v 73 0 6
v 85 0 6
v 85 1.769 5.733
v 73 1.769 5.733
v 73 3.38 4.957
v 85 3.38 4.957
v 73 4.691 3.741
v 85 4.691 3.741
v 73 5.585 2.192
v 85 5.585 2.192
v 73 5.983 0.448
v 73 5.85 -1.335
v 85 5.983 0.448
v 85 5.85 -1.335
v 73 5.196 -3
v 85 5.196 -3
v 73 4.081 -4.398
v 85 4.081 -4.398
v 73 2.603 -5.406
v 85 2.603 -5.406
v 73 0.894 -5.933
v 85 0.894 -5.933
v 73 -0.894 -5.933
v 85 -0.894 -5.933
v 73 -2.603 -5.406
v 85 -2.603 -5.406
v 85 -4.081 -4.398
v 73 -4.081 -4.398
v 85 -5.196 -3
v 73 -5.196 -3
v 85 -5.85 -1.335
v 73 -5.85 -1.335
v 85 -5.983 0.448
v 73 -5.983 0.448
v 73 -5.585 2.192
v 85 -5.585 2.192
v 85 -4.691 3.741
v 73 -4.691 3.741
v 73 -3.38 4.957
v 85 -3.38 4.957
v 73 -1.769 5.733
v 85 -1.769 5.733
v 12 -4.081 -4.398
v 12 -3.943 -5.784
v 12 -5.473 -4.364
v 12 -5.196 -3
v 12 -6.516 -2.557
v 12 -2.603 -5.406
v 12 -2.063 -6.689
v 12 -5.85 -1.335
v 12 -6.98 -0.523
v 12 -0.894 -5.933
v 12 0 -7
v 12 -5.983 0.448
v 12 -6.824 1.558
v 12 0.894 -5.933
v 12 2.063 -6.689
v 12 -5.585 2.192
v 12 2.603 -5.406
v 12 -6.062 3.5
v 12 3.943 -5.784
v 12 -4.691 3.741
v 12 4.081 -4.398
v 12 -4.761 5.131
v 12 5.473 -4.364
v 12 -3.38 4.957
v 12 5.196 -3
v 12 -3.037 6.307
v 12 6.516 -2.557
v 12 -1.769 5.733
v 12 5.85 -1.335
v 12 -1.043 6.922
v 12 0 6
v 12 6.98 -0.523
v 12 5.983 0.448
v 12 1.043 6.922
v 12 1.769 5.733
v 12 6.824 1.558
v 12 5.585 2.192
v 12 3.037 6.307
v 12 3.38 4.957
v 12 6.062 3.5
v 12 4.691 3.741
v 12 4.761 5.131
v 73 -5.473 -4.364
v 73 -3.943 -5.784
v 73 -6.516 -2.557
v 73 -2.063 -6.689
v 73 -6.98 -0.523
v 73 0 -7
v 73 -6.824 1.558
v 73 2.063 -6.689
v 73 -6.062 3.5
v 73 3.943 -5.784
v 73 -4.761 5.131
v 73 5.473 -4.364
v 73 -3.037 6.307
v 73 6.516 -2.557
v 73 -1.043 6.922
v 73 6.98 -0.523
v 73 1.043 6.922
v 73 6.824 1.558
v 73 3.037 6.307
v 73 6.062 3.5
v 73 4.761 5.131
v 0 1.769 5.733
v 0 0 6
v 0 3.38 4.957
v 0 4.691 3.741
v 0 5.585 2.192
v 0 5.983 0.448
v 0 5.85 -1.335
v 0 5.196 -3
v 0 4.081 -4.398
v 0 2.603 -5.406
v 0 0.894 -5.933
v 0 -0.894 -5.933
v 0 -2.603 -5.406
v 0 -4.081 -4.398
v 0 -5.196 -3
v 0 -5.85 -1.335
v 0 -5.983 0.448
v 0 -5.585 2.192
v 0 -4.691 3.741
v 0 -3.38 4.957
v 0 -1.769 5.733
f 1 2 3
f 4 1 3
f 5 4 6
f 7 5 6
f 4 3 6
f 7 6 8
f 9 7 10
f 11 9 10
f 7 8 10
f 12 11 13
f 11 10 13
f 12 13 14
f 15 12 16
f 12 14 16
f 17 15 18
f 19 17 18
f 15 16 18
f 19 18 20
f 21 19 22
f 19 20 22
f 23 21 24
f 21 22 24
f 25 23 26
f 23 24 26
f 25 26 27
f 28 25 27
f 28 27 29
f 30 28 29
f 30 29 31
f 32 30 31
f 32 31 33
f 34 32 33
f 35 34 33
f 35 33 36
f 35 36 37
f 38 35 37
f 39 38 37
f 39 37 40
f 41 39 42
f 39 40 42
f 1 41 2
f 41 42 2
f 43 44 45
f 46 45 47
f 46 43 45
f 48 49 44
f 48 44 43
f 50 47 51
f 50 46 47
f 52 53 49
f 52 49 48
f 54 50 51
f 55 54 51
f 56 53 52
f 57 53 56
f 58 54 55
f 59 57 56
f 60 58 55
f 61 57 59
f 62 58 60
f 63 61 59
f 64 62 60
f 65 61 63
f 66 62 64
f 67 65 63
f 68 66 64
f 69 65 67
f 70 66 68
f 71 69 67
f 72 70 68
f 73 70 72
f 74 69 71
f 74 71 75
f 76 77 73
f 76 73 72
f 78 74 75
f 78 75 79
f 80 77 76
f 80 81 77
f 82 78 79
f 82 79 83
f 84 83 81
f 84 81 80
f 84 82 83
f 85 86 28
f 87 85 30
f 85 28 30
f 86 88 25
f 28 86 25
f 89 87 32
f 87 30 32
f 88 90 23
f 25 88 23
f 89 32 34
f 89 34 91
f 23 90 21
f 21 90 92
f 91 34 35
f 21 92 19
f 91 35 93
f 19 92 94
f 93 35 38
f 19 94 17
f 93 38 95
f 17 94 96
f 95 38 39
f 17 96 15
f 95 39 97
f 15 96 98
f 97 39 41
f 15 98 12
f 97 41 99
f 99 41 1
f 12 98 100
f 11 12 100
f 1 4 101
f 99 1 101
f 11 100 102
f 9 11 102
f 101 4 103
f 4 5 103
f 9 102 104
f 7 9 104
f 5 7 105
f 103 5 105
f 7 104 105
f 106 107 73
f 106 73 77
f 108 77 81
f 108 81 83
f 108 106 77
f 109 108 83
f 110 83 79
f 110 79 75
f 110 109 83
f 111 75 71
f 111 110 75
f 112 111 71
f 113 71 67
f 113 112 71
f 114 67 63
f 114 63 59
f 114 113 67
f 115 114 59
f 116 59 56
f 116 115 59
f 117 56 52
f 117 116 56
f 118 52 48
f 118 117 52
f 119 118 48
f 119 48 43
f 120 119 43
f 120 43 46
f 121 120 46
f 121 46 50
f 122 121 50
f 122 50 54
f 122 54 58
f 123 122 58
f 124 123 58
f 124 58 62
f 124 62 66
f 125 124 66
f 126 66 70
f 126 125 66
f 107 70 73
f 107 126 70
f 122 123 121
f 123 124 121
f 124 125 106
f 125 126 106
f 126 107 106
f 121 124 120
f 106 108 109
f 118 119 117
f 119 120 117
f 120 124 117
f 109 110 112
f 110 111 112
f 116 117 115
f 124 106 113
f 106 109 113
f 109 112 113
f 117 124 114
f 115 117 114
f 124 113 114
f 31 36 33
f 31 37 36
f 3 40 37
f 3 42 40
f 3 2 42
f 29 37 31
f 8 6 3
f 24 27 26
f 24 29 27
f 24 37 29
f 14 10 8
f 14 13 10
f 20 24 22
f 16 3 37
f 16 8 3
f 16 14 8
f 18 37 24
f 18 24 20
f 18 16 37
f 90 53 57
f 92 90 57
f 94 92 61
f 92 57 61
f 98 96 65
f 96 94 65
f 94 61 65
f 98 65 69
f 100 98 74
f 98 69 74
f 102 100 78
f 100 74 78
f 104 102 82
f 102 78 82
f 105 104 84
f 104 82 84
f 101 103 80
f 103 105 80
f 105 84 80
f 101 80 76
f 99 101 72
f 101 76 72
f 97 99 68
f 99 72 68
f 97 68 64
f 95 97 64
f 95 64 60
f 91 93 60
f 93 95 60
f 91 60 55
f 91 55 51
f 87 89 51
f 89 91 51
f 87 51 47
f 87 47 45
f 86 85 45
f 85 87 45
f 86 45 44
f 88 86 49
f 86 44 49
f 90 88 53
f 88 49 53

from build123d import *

# Parameters (mm, degrees)
SKETCH_1_R          = 7
EXTRUDE_1_DEPTH     = 85
SKETCH_2_R          = 7.5
SKETCH_2_R_2        = 6
CUT_EXTRUDE_1_DEPTH = 12


with BuildPart() as part:
    # 草图1 → 凸台-拉伸1 (new body)
    with BuildSketch(Plane(origin=(0, 0, 0), x_dir=(0, 0, -1), z_dir=(1, 0, 0))):
        Circle(SKETCH_1_R)
    extrude(amount=EXTRUDE_1_DEPTH)

    # 草图2 → 切除-拉伸1 (cut)
    with BuildSketch(Plane.ZY):
        Circle(SKETCH_2_R)
        Circle(SKETCH_2_R_2, mode=Mode.SUBTRACT)
    cut_extrude_1 = extrude(amount=-CUT_EXTRUDE_1_DEPTH, mode=Mode.SUBTRACT)

    # 镜向1: 切除-拉伸1 across plane
    add(cut_extrude_1.mirror(Plane(origin=(42.5, 0, 0), x_dir=(0, 0, 1), z_dir=(1, 0, 0))), mode=Mode.SUBTRACT)


solid = part.part
